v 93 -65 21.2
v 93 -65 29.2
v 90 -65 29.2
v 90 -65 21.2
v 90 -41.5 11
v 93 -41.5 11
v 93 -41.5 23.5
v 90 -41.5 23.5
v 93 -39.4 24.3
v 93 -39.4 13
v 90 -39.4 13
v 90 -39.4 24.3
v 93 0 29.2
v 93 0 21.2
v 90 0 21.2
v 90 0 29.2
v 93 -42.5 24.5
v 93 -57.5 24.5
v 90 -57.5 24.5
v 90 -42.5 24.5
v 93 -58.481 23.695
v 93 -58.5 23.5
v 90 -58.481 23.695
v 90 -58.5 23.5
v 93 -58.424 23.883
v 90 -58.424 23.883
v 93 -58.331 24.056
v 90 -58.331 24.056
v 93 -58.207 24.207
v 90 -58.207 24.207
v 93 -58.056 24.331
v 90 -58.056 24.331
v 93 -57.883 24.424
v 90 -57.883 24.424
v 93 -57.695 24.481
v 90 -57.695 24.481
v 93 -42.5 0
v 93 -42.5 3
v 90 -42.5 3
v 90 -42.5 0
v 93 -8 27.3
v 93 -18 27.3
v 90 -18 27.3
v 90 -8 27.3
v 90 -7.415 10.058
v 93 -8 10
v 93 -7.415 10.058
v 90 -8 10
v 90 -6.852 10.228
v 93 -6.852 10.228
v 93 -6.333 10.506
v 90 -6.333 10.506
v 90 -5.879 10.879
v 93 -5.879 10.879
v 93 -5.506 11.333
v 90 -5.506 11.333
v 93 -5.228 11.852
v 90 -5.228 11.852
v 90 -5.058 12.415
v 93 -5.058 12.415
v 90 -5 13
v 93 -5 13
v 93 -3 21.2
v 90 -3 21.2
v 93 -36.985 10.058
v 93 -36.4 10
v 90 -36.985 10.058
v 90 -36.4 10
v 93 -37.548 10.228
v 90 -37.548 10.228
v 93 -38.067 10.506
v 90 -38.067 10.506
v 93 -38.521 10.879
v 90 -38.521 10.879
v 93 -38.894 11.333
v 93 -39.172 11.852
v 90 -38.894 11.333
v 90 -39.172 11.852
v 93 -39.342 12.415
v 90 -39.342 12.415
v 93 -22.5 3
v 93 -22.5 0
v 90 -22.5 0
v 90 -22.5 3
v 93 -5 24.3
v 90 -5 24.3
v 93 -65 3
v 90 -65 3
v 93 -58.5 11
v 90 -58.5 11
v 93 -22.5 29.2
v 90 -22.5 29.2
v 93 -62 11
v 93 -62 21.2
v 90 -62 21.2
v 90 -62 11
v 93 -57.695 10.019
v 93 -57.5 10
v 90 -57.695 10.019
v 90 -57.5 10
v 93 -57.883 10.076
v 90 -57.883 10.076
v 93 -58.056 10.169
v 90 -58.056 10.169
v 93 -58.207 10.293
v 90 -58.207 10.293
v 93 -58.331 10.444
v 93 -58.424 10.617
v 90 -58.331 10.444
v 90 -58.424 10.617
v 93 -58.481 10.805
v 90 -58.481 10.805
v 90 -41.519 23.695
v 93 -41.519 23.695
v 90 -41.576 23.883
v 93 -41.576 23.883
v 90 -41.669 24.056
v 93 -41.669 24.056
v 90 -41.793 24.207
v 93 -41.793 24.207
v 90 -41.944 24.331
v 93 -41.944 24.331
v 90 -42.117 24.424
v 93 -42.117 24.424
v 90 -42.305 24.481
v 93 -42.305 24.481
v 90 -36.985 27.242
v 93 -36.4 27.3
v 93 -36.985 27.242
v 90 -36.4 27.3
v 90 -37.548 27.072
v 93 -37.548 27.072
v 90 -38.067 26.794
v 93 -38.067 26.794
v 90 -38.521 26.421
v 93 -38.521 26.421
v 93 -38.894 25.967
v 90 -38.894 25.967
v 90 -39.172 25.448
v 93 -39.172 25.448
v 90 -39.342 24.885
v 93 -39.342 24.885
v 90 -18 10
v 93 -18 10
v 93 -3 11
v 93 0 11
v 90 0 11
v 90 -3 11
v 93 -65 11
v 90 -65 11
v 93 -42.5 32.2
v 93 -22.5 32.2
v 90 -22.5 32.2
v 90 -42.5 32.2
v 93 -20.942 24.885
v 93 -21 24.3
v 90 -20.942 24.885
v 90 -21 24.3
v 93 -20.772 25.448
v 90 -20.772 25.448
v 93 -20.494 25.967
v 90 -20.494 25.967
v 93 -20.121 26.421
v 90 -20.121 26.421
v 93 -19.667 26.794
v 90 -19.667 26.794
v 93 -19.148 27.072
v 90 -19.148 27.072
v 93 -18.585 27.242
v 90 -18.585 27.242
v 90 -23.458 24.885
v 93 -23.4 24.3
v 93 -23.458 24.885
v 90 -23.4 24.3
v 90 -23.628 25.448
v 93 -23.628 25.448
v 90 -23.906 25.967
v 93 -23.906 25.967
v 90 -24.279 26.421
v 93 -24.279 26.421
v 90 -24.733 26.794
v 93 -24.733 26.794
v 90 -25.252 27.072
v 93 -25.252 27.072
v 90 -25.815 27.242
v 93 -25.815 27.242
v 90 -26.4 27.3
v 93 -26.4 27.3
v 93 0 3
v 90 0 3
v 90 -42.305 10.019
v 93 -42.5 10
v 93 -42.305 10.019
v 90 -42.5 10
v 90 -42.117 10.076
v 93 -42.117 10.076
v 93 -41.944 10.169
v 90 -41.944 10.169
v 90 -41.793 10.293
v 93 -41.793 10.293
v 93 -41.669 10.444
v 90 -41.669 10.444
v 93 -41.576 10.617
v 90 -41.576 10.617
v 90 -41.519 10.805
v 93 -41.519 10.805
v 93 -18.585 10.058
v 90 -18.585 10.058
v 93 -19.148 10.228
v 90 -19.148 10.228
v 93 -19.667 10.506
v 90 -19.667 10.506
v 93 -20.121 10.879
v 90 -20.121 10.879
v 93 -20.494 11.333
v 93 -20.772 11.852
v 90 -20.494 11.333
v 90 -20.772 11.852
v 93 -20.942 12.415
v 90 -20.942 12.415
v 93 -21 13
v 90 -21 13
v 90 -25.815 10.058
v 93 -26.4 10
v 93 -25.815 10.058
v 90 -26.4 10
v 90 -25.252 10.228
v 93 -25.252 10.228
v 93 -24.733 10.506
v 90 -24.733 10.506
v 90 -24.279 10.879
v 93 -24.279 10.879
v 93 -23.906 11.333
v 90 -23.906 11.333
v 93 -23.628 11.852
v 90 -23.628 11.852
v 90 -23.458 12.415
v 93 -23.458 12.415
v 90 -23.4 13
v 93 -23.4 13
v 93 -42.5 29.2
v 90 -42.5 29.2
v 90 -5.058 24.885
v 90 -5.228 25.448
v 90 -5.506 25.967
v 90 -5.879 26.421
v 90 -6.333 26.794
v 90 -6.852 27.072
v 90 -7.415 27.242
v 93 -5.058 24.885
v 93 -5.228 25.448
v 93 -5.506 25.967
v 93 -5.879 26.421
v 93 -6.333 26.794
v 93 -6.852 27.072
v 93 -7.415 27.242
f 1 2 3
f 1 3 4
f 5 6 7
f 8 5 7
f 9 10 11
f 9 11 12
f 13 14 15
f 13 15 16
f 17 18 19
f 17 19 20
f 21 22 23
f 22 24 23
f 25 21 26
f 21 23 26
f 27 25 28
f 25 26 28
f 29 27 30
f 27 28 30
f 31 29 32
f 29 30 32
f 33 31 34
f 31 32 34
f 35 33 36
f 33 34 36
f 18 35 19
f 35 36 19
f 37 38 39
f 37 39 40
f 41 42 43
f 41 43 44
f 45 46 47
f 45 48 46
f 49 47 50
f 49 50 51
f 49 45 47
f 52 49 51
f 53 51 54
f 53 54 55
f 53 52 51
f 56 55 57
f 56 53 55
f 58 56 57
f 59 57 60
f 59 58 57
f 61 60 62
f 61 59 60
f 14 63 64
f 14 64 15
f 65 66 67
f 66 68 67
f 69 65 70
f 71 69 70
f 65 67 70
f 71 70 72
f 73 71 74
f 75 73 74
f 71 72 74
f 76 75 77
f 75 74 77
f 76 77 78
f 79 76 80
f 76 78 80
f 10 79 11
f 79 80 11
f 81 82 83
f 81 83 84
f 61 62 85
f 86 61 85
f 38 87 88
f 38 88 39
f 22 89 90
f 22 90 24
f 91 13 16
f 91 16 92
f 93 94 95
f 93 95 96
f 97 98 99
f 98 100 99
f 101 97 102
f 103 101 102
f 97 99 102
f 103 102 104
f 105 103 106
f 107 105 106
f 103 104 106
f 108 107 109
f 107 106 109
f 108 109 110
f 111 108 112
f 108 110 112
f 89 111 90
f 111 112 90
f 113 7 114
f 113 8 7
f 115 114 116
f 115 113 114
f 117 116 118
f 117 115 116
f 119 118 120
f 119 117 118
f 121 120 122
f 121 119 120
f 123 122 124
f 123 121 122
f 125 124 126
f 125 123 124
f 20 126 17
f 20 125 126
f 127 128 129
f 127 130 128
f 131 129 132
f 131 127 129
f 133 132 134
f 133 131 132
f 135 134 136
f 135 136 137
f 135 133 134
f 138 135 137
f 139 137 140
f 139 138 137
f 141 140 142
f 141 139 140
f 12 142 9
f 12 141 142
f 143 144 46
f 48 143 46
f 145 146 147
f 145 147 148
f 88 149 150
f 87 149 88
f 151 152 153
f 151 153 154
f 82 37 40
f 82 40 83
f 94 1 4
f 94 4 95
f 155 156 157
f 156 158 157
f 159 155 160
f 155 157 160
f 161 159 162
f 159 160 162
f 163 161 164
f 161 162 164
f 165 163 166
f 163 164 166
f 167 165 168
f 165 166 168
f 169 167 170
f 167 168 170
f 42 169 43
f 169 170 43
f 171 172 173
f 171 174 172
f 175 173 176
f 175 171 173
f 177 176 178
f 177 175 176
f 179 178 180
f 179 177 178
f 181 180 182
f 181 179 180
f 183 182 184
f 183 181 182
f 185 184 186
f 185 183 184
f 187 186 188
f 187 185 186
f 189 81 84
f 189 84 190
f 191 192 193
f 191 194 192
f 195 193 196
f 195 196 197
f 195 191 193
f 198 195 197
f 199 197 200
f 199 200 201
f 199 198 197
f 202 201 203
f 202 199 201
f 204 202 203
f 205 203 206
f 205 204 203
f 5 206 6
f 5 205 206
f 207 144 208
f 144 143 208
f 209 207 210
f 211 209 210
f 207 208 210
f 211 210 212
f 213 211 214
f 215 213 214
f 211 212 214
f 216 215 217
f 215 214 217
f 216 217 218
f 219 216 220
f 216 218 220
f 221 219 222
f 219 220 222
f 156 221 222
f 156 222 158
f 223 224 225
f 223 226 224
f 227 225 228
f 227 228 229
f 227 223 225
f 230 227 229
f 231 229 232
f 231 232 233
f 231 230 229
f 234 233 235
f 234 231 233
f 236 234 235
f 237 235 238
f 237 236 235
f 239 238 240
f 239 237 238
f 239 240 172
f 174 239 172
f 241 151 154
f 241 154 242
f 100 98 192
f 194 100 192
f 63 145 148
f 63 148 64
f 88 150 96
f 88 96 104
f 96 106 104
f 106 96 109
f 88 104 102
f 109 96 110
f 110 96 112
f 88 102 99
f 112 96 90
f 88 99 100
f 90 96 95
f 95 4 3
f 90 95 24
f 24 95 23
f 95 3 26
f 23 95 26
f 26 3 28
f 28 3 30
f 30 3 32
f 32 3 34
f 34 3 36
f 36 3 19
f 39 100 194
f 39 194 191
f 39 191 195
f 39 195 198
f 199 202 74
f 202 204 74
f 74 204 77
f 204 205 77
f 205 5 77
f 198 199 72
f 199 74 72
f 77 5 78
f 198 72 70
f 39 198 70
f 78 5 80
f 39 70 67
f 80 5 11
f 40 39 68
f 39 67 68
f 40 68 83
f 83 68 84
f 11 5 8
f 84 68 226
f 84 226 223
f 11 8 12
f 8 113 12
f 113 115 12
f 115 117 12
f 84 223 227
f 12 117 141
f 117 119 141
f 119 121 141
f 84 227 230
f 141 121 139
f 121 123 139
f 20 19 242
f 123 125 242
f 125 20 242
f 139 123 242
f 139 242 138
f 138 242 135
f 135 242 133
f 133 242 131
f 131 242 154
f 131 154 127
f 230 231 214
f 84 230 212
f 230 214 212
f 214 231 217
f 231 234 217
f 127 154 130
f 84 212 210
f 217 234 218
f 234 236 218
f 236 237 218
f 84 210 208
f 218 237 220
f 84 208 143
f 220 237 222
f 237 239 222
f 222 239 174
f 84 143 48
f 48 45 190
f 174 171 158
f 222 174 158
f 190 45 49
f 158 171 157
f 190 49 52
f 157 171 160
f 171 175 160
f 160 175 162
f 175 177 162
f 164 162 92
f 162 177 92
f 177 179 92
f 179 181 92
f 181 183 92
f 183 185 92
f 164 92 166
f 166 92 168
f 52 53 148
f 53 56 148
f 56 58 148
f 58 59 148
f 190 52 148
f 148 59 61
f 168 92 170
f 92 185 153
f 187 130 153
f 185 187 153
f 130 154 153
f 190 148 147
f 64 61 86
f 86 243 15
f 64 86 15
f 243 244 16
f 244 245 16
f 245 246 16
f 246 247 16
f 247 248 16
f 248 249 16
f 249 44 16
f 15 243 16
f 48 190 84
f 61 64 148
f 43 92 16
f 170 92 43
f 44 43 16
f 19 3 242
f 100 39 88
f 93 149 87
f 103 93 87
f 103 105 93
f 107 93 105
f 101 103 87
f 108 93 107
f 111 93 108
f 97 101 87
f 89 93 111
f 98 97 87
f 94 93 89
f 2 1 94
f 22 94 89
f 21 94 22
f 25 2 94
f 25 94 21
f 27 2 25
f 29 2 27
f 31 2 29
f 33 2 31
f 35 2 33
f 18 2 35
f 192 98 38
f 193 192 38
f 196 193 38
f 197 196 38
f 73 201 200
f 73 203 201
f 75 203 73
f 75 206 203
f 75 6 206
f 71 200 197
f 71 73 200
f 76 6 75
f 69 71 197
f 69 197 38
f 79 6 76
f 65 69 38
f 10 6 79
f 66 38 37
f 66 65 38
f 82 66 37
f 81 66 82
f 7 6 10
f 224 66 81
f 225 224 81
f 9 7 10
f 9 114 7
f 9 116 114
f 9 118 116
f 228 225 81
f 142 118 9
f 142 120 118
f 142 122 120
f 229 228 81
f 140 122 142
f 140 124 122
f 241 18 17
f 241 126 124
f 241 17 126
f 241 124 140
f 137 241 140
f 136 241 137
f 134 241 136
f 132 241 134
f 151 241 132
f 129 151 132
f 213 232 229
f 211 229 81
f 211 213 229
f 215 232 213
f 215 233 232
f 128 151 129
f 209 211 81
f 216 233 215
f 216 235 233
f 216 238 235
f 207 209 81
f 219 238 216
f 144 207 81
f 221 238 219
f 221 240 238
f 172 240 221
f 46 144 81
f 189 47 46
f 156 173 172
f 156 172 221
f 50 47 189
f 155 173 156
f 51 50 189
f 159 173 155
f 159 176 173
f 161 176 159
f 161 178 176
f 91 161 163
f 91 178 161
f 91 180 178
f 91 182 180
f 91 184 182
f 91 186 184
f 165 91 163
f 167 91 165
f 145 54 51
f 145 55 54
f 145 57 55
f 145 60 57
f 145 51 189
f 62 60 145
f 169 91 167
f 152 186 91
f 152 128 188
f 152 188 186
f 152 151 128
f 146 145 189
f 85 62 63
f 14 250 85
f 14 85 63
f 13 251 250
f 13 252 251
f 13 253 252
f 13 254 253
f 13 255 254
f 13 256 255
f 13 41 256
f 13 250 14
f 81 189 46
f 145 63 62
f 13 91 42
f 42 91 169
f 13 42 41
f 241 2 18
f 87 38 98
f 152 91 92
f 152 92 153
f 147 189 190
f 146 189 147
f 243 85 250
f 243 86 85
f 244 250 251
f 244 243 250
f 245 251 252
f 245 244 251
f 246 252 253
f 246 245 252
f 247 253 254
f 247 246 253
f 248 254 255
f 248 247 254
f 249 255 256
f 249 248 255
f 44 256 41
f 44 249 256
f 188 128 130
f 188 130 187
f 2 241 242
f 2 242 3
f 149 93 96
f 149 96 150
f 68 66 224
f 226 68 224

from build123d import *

# Parameters (mm, degrees)
SKETCH008_W   = 17
SKETCH008_H   = 14.5
SKETCH008_W_2 = 16
SKETCH008_H_2 = 17.3
PAD002_DEPTH  = 3
FILLET_R      = 3
FILLET004_R   = 1


with BuildPart() as part:
    # Sketch008 → Pad002 (new body)
    with BuildSketch(Plane.YZ.offset(93)):
        Polygon((-42.5, 3), (-42.5, 0), (-22.5, 0), (-22.5, 3), (0, 3), (0, 11), (-3, 11), (-3, 21.2), (0, 21.2), (0, 29.2), (-22.5, 29.2), (-22.5, 32.2), (-42.5, 32.2), (-42.5, 29.2), (-65, 29.2), (-65, 21.2), (-62, 21.2), (-62, 11), (-65, 11), (-65, 3), align=None)
        with Locations((-50, 17.25)):
            Rectangle(SKETCH008_W, SKETCH008_H, mode=Mode.SUBTRACT)
        with Locations((-13, 18.65)):
            Rectangle(SKETCH008_W_2, SKETCH008_H_2, mode=Mode.SUBTRACT)
        with Locations((-31.4, 18.65)):
            Rectangle(SKETCH008_W_2, SKETCH008_H_2, mode=Mode.SUBTRACT)
    extrude(amount=-PAD002_DEPTH)

    # Fillet
    fillet_edges = [part.edges().sort_by_distance(p)[0] for p in [
        (91.5, -23.4, 10),
        (91.5, -5, 10),
        (91.5, -5, 27.3),
        (91.5, -23.4, 27.3),
        (91.5, -21, 10),
        (91.5, -39.4, 10),
        (91.5, -21, 27.3),
        (91.5, -39.4, 27.3),
    ]]
    fillet(fillet_edges, radius=FILLET_R)

    # Fillet004
    fillet004_edges = [part.edges().sort_by_distance(p)[0] for p in [
        (91.5, -58.5, 10),
        (91.5, -58.5, 24.5),
        (91.5, -41.5, 24.5),
        (91.5, -41.5, 10),
    ]]
    fillet(fillet004_edges, radius=FILLET004_R)


solid = part.part
